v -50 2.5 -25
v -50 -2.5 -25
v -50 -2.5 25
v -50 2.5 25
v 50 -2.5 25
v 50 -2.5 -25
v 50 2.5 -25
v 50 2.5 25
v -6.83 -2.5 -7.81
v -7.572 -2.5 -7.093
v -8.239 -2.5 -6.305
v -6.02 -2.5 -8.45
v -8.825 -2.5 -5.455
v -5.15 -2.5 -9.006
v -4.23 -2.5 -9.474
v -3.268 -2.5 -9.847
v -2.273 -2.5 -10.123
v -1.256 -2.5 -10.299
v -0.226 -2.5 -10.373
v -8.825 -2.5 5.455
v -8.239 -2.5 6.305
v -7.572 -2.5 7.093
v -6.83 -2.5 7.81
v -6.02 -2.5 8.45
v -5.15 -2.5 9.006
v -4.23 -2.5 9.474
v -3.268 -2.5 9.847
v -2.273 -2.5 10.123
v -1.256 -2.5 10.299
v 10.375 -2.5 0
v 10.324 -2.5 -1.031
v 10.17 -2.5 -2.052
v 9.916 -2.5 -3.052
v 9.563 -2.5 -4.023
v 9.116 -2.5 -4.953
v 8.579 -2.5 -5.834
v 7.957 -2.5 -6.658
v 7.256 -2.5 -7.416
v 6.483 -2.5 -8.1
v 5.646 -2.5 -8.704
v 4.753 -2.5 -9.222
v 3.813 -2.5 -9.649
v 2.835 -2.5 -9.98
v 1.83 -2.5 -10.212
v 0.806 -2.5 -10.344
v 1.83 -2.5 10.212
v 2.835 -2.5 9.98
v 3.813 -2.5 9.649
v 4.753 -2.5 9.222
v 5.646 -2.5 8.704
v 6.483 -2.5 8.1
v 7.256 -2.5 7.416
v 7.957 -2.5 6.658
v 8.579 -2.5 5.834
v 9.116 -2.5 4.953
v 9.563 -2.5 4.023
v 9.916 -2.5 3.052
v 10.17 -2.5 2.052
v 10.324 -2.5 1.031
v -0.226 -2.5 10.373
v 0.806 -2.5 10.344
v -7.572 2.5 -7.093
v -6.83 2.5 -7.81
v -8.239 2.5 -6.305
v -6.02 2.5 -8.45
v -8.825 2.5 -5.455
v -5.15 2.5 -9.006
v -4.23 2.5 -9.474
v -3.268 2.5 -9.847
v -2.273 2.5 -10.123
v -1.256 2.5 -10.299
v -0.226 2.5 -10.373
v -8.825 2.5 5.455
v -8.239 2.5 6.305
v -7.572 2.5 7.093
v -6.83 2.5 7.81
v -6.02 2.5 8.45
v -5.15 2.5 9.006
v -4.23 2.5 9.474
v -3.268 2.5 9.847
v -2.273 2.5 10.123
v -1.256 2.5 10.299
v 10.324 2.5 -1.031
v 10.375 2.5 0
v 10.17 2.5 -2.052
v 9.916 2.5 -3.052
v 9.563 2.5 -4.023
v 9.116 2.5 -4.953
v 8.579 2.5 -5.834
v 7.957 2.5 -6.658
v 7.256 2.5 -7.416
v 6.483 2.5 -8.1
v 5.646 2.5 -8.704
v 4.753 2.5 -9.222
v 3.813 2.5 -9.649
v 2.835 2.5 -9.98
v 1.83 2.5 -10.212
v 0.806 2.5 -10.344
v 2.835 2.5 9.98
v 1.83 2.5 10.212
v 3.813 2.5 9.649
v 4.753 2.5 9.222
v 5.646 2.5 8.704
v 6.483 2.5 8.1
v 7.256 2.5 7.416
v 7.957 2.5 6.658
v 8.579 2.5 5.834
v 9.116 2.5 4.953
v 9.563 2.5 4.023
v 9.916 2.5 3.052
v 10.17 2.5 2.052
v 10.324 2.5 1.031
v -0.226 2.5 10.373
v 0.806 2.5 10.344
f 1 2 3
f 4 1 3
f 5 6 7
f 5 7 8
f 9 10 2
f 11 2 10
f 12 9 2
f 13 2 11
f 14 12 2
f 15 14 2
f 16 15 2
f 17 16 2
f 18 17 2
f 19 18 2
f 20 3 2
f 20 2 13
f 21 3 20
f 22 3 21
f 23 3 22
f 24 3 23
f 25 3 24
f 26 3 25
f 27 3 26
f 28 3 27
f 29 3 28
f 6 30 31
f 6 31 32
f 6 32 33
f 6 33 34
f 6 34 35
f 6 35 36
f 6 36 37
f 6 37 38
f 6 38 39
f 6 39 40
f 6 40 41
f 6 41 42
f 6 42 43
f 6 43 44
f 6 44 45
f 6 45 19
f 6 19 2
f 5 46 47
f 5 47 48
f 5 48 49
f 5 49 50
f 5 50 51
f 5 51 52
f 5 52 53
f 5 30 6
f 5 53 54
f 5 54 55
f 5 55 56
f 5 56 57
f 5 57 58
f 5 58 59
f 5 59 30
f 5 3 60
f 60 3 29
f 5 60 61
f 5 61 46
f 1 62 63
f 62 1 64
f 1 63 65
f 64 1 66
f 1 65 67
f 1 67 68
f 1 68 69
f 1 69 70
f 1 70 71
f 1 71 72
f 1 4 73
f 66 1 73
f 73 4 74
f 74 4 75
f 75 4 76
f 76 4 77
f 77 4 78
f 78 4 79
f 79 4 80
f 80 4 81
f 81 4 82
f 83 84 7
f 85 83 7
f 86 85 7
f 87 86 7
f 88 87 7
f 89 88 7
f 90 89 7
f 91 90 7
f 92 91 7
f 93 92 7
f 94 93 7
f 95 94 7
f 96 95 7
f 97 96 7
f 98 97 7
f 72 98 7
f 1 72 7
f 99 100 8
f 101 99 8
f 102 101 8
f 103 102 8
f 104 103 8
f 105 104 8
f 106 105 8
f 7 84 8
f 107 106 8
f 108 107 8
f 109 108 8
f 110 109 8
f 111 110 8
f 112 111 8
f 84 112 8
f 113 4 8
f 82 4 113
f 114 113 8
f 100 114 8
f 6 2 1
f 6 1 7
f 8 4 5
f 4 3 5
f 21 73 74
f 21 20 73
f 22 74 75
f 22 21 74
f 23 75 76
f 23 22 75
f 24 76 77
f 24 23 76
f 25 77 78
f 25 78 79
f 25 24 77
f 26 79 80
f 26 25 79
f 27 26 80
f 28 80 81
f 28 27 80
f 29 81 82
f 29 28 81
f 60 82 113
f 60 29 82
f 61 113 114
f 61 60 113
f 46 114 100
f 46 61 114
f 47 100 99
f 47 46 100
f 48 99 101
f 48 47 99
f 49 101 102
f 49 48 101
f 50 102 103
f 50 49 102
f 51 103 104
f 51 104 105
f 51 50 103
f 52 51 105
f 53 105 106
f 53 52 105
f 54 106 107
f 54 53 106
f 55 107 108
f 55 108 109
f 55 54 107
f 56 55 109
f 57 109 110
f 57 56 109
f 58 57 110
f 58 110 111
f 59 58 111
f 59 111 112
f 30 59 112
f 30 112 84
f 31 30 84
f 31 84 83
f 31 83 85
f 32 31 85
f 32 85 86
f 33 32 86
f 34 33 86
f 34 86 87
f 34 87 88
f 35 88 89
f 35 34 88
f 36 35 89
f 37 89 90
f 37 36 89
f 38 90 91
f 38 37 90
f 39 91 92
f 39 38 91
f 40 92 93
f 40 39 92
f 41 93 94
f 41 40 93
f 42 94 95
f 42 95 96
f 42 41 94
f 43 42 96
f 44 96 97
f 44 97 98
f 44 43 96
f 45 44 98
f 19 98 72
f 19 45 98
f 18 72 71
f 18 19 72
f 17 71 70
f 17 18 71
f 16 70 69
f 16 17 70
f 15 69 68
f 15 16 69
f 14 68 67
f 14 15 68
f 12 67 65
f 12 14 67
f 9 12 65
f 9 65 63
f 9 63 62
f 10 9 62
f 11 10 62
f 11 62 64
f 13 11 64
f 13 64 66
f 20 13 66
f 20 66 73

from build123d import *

# Parameters (mm, degrees)
F0_W     = 100
F0_H     = 50
F1_DEPTH = 2.5


with BuildPart() as f1:
    # F0 (on Front) → F1 (new body, symmetric)
    with BuildSketch(Plane.XZ):
        Rectangle(F0_W, F0_H)
        with BuildLine():
            ThreePointArc((10.375, 0), (2.835445, -9.980024), (-8.825169, -5.455))
            Line((-8.825169, -5.455), (-8.825169, 0))
            Line((-8.825169, 0), (-8.825169, 5.455))
            ThreePointArc((-8.825169, 5.455), (2.835445, 9.980024), (10.375, 0))
        make_face(mode=Mode.SUBTRACT)
    extrude(amount=F1_DEPTH, both=True)


solid = f1.part
